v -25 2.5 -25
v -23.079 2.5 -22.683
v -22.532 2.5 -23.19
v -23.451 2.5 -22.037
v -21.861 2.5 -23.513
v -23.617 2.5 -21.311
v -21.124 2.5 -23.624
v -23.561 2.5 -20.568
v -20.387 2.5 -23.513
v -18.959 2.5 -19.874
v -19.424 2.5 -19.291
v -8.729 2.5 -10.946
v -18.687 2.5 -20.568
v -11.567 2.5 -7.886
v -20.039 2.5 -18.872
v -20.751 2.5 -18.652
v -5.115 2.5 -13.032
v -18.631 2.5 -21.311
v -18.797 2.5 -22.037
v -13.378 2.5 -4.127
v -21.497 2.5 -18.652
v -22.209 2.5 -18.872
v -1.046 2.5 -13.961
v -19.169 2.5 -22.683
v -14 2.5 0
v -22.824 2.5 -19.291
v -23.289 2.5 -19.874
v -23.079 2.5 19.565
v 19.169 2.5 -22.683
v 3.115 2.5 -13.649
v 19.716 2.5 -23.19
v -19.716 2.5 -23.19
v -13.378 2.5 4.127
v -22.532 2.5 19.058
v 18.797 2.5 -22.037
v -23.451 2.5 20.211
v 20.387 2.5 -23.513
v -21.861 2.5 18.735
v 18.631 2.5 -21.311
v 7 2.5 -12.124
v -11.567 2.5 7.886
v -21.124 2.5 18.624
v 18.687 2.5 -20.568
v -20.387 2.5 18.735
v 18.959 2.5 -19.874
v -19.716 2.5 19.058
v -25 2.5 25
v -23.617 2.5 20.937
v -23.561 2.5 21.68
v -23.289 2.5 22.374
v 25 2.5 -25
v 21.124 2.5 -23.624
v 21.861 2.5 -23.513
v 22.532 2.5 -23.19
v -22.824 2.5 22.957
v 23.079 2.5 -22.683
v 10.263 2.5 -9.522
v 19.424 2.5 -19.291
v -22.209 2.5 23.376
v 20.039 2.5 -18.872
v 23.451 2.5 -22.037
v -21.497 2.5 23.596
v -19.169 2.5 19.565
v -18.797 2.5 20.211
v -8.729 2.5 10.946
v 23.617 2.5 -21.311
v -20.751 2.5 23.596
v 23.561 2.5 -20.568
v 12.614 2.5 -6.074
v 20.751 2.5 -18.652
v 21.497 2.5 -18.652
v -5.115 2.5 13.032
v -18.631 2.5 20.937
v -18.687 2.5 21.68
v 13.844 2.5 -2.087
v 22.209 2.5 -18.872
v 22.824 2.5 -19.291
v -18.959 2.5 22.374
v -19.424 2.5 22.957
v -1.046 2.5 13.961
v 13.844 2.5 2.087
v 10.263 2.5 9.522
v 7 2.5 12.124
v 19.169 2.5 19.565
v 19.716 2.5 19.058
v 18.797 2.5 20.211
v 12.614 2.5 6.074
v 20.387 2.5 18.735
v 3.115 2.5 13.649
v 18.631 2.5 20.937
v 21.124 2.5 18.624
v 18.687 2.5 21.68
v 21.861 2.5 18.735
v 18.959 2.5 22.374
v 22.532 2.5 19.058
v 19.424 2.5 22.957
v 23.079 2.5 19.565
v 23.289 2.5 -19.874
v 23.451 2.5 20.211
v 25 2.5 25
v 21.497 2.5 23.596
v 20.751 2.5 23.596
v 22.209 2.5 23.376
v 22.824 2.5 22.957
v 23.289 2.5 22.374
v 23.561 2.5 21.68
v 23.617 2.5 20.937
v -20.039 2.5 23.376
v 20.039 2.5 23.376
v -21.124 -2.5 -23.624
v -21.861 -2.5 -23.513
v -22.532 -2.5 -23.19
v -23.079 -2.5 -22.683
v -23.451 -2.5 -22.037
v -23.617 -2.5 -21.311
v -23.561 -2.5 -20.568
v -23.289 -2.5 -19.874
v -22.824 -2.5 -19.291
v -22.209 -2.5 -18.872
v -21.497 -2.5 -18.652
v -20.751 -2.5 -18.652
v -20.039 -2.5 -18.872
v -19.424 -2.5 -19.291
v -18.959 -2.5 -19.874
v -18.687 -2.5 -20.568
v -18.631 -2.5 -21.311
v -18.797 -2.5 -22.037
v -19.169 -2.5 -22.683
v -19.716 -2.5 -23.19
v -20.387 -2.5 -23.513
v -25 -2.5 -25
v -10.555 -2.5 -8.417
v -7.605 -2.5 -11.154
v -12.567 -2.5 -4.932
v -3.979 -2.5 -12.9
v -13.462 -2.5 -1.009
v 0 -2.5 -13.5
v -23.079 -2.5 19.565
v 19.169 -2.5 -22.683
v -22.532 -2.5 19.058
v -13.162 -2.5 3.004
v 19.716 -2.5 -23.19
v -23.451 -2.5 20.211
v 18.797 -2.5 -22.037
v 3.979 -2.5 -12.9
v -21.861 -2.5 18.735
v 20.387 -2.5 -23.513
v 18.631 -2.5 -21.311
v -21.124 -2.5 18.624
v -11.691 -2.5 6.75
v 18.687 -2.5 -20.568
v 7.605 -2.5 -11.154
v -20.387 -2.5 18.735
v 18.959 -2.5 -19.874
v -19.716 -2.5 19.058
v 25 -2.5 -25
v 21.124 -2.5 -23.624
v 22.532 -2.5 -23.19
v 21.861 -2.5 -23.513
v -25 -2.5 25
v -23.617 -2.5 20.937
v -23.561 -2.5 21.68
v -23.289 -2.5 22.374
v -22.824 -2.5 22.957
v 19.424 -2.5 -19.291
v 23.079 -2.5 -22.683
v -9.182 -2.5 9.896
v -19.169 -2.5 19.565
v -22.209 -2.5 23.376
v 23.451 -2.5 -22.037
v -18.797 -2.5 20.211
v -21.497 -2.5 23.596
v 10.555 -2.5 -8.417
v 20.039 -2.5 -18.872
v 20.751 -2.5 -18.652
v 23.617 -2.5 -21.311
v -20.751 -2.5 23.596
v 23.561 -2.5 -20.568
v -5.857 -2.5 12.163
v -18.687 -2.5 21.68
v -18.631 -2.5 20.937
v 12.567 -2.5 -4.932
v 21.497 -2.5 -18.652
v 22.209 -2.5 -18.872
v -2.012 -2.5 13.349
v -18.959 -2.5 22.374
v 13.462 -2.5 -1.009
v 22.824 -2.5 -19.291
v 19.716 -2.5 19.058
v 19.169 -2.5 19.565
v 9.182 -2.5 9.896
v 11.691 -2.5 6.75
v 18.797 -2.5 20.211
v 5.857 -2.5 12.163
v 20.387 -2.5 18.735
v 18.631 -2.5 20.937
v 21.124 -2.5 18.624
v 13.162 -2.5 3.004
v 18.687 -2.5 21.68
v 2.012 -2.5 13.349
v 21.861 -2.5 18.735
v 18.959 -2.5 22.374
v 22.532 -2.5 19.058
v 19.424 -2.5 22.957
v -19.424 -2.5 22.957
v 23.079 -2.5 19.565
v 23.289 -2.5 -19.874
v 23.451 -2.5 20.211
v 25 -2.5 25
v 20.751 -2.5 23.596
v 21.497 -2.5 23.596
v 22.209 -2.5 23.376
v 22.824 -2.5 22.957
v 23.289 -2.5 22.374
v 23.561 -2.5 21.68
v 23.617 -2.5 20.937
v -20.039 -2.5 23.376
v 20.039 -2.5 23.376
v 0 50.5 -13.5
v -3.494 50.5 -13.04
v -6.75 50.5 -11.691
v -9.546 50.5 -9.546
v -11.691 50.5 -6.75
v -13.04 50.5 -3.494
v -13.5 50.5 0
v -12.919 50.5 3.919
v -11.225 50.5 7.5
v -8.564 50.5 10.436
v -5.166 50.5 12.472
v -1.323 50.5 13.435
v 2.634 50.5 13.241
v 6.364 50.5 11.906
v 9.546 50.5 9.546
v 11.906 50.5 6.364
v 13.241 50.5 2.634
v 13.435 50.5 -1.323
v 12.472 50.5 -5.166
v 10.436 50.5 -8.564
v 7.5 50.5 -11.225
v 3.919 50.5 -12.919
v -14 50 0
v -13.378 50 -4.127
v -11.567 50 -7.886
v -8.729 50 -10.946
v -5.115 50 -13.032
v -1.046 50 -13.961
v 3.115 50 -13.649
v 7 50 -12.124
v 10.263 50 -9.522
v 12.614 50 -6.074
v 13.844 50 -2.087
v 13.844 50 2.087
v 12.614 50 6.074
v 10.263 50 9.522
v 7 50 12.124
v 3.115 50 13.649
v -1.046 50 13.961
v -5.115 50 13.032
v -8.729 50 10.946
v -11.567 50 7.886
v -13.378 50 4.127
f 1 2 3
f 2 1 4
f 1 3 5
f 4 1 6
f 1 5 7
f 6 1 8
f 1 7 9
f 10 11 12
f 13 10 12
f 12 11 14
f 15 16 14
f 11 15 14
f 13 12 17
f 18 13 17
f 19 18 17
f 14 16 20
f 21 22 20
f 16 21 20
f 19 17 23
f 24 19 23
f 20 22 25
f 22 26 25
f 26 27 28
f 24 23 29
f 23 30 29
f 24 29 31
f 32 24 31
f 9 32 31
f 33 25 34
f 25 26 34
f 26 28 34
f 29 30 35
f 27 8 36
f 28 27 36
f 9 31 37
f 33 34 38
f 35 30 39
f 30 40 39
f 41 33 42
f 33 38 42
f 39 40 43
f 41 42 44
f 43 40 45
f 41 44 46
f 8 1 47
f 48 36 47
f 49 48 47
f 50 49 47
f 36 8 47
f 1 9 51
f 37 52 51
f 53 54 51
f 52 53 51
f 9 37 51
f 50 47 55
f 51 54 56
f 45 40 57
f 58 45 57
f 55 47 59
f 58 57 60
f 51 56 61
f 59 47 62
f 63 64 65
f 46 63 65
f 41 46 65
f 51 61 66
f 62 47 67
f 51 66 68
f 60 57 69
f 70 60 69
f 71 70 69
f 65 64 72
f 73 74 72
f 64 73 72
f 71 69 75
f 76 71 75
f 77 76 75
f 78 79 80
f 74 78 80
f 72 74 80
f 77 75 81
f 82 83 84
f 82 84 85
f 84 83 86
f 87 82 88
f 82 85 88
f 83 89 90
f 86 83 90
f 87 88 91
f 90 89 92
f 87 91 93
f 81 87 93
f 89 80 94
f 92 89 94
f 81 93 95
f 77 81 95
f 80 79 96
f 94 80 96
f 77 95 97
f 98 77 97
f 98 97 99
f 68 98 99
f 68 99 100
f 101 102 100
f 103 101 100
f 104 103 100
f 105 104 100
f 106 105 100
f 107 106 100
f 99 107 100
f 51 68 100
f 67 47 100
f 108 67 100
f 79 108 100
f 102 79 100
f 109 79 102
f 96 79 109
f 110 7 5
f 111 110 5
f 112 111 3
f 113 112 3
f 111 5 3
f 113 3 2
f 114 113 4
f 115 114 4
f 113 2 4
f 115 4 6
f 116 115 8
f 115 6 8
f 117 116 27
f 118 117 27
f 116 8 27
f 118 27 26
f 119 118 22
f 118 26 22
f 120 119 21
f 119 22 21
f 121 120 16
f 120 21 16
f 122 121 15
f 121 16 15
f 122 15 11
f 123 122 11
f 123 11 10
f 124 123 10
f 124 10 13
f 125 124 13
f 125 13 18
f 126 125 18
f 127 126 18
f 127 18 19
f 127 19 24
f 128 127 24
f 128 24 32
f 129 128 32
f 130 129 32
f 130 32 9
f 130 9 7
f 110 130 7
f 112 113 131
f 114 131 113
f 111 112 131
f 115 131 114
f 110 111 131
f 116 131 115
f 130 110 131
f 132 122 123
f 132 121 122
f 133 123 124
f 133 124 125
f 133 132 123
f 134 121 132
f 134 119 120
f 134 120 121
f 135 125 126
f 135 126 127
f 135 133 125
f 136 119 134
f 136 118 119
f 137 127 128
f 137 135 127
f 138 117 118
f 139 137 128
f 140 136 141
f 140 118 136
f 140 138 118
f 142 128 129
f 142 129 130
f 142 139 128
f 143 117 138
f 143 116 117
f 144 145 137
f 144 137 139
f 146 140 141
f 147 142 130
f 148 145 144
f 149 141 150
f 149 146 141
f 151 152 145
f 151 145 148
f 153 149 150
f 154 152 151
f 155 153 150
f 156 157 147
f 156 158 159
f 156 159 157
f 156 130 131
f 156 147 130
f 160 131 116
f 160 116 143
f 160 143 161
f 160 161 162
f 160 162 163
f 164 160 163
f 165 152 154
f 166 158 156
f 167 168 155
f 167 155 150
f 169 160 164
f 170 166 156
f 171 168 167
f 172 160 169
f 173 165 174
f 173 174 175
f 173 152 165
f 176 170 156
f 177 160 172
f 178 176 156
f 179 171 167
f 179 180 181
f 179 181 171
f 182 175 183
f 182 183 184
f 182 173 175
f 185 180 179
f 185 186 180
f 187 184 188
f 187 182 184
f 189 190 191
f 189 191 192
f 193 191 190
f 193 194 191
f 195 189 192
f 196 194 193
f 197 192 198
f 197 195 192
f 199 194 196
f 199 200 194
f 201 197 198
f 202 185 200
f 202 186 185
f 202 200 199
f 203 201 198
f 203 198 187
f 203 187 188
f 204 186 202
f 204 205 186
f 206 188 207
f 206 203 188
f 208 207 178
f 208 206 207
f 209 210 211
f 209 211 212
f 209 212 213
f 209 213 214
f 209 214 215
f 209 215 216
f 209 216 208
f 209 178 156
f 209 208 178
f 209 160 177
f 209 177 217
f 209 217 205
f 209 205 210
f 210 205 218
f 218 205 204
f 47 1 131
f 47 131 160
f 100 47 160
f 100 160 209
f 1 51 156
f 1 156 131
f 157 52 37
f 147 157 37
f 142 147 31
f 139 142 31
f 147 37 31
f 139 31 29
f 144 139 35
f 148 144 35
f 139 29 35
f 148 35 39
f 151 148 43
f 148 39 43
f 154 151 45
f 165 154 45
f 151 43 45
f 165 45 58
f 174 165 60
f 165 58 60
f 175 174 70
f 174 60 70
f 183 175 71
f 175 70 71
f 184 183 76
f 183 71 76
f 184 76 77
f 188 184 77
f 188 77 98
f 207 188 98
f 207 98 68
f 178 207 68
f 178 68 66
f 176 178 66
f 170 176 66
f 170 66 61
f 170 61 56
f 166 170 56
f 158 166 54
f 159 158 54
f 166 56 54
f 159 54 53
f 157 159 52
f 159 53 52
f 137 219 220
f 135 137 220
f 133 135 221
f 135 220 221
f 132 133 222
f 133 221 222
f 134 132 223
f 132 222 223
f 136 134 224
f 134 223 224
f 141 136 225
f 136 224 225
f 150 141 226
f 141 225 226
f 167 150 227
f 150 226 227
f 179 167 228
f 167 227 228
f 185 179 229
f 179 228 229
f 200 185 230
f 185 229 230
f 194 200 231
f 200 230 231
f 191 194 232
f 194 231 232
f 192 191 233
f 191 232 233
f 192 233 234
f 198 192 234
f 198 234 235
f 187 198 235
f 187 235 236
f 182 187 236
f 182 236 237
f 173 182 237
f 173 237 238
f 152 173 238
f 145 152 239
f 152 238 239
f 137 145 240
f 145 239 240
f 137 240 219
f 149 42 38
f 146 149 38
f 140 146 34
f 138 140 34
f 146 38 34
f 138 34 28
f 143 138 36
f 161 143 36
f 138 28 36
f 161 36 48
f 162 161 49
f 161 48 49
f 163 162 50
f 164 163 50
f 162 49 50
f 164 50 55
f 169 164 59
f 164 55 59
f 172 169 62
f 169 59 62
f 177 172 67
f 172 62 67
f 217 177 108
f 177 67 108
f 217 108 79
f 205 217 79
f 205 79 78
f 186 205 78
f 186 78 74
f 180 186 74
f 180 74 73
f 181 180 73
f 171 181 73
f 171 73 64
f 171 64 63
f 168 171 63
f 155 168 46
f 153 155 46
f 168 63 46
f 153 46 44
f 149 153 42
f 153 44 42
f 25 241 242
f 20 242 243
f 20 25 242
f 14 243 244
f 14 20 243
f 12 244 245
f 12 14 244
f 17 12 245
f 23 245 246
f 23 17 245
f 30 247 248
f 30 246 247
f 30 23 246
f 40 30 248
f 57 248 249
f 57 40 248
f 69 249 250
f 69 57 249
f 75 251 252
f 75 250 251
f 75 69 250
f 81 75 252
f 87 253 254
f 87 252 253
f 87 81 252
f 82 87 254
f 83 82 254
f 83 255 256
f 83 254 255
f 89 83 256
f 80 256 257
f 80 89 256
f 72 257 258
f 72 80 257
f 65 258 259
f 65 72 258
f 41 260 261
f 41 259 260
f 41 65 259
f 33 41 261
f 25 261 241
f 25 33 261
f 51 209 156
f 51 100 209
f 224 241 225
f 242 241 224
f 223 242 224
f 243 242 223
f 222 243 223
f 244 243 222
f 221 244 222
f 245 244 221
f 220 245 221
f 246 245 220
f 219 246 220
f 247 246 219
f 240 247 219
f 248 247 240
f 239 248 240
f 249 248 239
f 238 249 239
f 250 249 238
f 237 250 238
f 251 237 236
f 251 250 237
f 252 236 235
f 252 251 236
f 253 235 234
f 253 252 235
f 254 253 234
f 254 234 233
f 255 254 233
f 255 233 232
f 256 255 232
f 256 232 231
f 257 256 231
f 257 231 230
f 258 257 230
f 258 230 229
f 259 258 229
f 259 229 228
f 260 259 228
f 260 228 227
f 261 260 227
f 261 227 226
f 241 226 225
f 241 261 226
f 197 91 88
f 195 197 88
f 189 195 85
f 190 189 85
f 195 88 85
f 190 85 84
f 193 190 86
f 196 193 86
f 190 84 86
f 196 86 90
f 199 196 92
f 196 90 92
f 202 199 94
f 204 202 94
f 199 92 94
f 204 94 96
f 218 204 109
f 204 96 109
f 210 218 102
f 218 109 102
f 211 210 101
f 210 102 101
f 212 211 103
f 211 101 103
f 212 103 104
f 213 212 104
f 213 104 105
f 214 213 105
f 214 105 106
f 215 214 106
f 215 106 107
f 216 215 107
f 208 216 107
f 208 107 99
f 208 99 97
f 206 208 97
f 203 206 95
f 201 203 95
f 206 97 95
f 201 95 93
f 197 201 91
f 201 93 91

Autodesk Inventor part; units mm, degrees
ref_plane "YZ Plane" through (0, 0, 0) normal (1, 0, 0) x (0, 1, 0)
ref_plane "XZ Plane" through (0, 0, 0) normal (0, 1, 0) x (-1, 0, 0)
ref_plane "XY Plane" through (0, 0, 0) normal (0, 0, 1) x (1, 0, 0)
sketch "Skizze1" plane through (0, 0, 0) normal (0, 1, 0) x (-1, 0, 0)
  circle A0 centre (0, 0) radius 14
  dimension "d0" = 28
extrude "Extrusion1" add sketch "Skizze1" along normal blind 51
sketch "Skizze2" plane through (0, 0, 0) normal (0, -1, 0) x (1, 0, 0)
  line L0 (-25, 25) -> (25, 25)
  line L1 (25, 25) -> (25, -25)
  line L2 (25, -25) -> (-25, -25)
  line L3 (-25, -25) -> (-25, 25)
  line L4 (-25, 25) -> (25, -25) construction
  line L5 (25, 25) -> (-25, -25) construction
  point P0 (0, 0)
  dimension "d3" = 50
  dimension "d4" = 50
extrude "Extrusion2" add sketch "Skizze2" along normal mid plane 5
chamfer "Fasen1" distance 1 angle 45 1 edges at (14, 51, 0)
sketch "Skizze3" plane through (0, -2.5, 0) normal (0, -1, 0) x (1, 0, 0)
  point P0 (0, 0)
  point P1 (0, 0)
hole "Bohrung1" at (0, -2.5, 0) direction (0, 1, 0) diameter 27 end through all
sketch "Skizze4" plane through (0, -2.5, 0) normal (0, -1, 0) x (1, 0, 0)
  line L0 (-25, -25) -> (-25, 25) projected
  line L1 (-25, 0) -> (25, 0) construction
  line L2 (25, 25) -> (25, -25) projected
  line L3 (-25, 25) -> (25, 25) projected
  line L4 (0, 25) -> (0, -21.9496) construction
  point P0 (0, 0)
  point P1 (-21.124, -21.124)
  point P2 (-21.124, 21.124)
  point P3 (21.124, -21.124)
  point P4 (21.124, 21.124)
  dimension "d30" = 42.248
  dimension "d31" = 42.248
  dimension "d32" = 42.248
  dimension "d33" = 42.248
hole "Bohrung2" at (-21.124, -2.5, -21.124) at (-21.124, -2.5, 21.124) at (21.124, -2.5, -21.124) at (21.124, -2.5, 21.124) direction (0, 1, 0) diameter 5 depth 5
properties part number "candle_cylinder" material "Gold"
